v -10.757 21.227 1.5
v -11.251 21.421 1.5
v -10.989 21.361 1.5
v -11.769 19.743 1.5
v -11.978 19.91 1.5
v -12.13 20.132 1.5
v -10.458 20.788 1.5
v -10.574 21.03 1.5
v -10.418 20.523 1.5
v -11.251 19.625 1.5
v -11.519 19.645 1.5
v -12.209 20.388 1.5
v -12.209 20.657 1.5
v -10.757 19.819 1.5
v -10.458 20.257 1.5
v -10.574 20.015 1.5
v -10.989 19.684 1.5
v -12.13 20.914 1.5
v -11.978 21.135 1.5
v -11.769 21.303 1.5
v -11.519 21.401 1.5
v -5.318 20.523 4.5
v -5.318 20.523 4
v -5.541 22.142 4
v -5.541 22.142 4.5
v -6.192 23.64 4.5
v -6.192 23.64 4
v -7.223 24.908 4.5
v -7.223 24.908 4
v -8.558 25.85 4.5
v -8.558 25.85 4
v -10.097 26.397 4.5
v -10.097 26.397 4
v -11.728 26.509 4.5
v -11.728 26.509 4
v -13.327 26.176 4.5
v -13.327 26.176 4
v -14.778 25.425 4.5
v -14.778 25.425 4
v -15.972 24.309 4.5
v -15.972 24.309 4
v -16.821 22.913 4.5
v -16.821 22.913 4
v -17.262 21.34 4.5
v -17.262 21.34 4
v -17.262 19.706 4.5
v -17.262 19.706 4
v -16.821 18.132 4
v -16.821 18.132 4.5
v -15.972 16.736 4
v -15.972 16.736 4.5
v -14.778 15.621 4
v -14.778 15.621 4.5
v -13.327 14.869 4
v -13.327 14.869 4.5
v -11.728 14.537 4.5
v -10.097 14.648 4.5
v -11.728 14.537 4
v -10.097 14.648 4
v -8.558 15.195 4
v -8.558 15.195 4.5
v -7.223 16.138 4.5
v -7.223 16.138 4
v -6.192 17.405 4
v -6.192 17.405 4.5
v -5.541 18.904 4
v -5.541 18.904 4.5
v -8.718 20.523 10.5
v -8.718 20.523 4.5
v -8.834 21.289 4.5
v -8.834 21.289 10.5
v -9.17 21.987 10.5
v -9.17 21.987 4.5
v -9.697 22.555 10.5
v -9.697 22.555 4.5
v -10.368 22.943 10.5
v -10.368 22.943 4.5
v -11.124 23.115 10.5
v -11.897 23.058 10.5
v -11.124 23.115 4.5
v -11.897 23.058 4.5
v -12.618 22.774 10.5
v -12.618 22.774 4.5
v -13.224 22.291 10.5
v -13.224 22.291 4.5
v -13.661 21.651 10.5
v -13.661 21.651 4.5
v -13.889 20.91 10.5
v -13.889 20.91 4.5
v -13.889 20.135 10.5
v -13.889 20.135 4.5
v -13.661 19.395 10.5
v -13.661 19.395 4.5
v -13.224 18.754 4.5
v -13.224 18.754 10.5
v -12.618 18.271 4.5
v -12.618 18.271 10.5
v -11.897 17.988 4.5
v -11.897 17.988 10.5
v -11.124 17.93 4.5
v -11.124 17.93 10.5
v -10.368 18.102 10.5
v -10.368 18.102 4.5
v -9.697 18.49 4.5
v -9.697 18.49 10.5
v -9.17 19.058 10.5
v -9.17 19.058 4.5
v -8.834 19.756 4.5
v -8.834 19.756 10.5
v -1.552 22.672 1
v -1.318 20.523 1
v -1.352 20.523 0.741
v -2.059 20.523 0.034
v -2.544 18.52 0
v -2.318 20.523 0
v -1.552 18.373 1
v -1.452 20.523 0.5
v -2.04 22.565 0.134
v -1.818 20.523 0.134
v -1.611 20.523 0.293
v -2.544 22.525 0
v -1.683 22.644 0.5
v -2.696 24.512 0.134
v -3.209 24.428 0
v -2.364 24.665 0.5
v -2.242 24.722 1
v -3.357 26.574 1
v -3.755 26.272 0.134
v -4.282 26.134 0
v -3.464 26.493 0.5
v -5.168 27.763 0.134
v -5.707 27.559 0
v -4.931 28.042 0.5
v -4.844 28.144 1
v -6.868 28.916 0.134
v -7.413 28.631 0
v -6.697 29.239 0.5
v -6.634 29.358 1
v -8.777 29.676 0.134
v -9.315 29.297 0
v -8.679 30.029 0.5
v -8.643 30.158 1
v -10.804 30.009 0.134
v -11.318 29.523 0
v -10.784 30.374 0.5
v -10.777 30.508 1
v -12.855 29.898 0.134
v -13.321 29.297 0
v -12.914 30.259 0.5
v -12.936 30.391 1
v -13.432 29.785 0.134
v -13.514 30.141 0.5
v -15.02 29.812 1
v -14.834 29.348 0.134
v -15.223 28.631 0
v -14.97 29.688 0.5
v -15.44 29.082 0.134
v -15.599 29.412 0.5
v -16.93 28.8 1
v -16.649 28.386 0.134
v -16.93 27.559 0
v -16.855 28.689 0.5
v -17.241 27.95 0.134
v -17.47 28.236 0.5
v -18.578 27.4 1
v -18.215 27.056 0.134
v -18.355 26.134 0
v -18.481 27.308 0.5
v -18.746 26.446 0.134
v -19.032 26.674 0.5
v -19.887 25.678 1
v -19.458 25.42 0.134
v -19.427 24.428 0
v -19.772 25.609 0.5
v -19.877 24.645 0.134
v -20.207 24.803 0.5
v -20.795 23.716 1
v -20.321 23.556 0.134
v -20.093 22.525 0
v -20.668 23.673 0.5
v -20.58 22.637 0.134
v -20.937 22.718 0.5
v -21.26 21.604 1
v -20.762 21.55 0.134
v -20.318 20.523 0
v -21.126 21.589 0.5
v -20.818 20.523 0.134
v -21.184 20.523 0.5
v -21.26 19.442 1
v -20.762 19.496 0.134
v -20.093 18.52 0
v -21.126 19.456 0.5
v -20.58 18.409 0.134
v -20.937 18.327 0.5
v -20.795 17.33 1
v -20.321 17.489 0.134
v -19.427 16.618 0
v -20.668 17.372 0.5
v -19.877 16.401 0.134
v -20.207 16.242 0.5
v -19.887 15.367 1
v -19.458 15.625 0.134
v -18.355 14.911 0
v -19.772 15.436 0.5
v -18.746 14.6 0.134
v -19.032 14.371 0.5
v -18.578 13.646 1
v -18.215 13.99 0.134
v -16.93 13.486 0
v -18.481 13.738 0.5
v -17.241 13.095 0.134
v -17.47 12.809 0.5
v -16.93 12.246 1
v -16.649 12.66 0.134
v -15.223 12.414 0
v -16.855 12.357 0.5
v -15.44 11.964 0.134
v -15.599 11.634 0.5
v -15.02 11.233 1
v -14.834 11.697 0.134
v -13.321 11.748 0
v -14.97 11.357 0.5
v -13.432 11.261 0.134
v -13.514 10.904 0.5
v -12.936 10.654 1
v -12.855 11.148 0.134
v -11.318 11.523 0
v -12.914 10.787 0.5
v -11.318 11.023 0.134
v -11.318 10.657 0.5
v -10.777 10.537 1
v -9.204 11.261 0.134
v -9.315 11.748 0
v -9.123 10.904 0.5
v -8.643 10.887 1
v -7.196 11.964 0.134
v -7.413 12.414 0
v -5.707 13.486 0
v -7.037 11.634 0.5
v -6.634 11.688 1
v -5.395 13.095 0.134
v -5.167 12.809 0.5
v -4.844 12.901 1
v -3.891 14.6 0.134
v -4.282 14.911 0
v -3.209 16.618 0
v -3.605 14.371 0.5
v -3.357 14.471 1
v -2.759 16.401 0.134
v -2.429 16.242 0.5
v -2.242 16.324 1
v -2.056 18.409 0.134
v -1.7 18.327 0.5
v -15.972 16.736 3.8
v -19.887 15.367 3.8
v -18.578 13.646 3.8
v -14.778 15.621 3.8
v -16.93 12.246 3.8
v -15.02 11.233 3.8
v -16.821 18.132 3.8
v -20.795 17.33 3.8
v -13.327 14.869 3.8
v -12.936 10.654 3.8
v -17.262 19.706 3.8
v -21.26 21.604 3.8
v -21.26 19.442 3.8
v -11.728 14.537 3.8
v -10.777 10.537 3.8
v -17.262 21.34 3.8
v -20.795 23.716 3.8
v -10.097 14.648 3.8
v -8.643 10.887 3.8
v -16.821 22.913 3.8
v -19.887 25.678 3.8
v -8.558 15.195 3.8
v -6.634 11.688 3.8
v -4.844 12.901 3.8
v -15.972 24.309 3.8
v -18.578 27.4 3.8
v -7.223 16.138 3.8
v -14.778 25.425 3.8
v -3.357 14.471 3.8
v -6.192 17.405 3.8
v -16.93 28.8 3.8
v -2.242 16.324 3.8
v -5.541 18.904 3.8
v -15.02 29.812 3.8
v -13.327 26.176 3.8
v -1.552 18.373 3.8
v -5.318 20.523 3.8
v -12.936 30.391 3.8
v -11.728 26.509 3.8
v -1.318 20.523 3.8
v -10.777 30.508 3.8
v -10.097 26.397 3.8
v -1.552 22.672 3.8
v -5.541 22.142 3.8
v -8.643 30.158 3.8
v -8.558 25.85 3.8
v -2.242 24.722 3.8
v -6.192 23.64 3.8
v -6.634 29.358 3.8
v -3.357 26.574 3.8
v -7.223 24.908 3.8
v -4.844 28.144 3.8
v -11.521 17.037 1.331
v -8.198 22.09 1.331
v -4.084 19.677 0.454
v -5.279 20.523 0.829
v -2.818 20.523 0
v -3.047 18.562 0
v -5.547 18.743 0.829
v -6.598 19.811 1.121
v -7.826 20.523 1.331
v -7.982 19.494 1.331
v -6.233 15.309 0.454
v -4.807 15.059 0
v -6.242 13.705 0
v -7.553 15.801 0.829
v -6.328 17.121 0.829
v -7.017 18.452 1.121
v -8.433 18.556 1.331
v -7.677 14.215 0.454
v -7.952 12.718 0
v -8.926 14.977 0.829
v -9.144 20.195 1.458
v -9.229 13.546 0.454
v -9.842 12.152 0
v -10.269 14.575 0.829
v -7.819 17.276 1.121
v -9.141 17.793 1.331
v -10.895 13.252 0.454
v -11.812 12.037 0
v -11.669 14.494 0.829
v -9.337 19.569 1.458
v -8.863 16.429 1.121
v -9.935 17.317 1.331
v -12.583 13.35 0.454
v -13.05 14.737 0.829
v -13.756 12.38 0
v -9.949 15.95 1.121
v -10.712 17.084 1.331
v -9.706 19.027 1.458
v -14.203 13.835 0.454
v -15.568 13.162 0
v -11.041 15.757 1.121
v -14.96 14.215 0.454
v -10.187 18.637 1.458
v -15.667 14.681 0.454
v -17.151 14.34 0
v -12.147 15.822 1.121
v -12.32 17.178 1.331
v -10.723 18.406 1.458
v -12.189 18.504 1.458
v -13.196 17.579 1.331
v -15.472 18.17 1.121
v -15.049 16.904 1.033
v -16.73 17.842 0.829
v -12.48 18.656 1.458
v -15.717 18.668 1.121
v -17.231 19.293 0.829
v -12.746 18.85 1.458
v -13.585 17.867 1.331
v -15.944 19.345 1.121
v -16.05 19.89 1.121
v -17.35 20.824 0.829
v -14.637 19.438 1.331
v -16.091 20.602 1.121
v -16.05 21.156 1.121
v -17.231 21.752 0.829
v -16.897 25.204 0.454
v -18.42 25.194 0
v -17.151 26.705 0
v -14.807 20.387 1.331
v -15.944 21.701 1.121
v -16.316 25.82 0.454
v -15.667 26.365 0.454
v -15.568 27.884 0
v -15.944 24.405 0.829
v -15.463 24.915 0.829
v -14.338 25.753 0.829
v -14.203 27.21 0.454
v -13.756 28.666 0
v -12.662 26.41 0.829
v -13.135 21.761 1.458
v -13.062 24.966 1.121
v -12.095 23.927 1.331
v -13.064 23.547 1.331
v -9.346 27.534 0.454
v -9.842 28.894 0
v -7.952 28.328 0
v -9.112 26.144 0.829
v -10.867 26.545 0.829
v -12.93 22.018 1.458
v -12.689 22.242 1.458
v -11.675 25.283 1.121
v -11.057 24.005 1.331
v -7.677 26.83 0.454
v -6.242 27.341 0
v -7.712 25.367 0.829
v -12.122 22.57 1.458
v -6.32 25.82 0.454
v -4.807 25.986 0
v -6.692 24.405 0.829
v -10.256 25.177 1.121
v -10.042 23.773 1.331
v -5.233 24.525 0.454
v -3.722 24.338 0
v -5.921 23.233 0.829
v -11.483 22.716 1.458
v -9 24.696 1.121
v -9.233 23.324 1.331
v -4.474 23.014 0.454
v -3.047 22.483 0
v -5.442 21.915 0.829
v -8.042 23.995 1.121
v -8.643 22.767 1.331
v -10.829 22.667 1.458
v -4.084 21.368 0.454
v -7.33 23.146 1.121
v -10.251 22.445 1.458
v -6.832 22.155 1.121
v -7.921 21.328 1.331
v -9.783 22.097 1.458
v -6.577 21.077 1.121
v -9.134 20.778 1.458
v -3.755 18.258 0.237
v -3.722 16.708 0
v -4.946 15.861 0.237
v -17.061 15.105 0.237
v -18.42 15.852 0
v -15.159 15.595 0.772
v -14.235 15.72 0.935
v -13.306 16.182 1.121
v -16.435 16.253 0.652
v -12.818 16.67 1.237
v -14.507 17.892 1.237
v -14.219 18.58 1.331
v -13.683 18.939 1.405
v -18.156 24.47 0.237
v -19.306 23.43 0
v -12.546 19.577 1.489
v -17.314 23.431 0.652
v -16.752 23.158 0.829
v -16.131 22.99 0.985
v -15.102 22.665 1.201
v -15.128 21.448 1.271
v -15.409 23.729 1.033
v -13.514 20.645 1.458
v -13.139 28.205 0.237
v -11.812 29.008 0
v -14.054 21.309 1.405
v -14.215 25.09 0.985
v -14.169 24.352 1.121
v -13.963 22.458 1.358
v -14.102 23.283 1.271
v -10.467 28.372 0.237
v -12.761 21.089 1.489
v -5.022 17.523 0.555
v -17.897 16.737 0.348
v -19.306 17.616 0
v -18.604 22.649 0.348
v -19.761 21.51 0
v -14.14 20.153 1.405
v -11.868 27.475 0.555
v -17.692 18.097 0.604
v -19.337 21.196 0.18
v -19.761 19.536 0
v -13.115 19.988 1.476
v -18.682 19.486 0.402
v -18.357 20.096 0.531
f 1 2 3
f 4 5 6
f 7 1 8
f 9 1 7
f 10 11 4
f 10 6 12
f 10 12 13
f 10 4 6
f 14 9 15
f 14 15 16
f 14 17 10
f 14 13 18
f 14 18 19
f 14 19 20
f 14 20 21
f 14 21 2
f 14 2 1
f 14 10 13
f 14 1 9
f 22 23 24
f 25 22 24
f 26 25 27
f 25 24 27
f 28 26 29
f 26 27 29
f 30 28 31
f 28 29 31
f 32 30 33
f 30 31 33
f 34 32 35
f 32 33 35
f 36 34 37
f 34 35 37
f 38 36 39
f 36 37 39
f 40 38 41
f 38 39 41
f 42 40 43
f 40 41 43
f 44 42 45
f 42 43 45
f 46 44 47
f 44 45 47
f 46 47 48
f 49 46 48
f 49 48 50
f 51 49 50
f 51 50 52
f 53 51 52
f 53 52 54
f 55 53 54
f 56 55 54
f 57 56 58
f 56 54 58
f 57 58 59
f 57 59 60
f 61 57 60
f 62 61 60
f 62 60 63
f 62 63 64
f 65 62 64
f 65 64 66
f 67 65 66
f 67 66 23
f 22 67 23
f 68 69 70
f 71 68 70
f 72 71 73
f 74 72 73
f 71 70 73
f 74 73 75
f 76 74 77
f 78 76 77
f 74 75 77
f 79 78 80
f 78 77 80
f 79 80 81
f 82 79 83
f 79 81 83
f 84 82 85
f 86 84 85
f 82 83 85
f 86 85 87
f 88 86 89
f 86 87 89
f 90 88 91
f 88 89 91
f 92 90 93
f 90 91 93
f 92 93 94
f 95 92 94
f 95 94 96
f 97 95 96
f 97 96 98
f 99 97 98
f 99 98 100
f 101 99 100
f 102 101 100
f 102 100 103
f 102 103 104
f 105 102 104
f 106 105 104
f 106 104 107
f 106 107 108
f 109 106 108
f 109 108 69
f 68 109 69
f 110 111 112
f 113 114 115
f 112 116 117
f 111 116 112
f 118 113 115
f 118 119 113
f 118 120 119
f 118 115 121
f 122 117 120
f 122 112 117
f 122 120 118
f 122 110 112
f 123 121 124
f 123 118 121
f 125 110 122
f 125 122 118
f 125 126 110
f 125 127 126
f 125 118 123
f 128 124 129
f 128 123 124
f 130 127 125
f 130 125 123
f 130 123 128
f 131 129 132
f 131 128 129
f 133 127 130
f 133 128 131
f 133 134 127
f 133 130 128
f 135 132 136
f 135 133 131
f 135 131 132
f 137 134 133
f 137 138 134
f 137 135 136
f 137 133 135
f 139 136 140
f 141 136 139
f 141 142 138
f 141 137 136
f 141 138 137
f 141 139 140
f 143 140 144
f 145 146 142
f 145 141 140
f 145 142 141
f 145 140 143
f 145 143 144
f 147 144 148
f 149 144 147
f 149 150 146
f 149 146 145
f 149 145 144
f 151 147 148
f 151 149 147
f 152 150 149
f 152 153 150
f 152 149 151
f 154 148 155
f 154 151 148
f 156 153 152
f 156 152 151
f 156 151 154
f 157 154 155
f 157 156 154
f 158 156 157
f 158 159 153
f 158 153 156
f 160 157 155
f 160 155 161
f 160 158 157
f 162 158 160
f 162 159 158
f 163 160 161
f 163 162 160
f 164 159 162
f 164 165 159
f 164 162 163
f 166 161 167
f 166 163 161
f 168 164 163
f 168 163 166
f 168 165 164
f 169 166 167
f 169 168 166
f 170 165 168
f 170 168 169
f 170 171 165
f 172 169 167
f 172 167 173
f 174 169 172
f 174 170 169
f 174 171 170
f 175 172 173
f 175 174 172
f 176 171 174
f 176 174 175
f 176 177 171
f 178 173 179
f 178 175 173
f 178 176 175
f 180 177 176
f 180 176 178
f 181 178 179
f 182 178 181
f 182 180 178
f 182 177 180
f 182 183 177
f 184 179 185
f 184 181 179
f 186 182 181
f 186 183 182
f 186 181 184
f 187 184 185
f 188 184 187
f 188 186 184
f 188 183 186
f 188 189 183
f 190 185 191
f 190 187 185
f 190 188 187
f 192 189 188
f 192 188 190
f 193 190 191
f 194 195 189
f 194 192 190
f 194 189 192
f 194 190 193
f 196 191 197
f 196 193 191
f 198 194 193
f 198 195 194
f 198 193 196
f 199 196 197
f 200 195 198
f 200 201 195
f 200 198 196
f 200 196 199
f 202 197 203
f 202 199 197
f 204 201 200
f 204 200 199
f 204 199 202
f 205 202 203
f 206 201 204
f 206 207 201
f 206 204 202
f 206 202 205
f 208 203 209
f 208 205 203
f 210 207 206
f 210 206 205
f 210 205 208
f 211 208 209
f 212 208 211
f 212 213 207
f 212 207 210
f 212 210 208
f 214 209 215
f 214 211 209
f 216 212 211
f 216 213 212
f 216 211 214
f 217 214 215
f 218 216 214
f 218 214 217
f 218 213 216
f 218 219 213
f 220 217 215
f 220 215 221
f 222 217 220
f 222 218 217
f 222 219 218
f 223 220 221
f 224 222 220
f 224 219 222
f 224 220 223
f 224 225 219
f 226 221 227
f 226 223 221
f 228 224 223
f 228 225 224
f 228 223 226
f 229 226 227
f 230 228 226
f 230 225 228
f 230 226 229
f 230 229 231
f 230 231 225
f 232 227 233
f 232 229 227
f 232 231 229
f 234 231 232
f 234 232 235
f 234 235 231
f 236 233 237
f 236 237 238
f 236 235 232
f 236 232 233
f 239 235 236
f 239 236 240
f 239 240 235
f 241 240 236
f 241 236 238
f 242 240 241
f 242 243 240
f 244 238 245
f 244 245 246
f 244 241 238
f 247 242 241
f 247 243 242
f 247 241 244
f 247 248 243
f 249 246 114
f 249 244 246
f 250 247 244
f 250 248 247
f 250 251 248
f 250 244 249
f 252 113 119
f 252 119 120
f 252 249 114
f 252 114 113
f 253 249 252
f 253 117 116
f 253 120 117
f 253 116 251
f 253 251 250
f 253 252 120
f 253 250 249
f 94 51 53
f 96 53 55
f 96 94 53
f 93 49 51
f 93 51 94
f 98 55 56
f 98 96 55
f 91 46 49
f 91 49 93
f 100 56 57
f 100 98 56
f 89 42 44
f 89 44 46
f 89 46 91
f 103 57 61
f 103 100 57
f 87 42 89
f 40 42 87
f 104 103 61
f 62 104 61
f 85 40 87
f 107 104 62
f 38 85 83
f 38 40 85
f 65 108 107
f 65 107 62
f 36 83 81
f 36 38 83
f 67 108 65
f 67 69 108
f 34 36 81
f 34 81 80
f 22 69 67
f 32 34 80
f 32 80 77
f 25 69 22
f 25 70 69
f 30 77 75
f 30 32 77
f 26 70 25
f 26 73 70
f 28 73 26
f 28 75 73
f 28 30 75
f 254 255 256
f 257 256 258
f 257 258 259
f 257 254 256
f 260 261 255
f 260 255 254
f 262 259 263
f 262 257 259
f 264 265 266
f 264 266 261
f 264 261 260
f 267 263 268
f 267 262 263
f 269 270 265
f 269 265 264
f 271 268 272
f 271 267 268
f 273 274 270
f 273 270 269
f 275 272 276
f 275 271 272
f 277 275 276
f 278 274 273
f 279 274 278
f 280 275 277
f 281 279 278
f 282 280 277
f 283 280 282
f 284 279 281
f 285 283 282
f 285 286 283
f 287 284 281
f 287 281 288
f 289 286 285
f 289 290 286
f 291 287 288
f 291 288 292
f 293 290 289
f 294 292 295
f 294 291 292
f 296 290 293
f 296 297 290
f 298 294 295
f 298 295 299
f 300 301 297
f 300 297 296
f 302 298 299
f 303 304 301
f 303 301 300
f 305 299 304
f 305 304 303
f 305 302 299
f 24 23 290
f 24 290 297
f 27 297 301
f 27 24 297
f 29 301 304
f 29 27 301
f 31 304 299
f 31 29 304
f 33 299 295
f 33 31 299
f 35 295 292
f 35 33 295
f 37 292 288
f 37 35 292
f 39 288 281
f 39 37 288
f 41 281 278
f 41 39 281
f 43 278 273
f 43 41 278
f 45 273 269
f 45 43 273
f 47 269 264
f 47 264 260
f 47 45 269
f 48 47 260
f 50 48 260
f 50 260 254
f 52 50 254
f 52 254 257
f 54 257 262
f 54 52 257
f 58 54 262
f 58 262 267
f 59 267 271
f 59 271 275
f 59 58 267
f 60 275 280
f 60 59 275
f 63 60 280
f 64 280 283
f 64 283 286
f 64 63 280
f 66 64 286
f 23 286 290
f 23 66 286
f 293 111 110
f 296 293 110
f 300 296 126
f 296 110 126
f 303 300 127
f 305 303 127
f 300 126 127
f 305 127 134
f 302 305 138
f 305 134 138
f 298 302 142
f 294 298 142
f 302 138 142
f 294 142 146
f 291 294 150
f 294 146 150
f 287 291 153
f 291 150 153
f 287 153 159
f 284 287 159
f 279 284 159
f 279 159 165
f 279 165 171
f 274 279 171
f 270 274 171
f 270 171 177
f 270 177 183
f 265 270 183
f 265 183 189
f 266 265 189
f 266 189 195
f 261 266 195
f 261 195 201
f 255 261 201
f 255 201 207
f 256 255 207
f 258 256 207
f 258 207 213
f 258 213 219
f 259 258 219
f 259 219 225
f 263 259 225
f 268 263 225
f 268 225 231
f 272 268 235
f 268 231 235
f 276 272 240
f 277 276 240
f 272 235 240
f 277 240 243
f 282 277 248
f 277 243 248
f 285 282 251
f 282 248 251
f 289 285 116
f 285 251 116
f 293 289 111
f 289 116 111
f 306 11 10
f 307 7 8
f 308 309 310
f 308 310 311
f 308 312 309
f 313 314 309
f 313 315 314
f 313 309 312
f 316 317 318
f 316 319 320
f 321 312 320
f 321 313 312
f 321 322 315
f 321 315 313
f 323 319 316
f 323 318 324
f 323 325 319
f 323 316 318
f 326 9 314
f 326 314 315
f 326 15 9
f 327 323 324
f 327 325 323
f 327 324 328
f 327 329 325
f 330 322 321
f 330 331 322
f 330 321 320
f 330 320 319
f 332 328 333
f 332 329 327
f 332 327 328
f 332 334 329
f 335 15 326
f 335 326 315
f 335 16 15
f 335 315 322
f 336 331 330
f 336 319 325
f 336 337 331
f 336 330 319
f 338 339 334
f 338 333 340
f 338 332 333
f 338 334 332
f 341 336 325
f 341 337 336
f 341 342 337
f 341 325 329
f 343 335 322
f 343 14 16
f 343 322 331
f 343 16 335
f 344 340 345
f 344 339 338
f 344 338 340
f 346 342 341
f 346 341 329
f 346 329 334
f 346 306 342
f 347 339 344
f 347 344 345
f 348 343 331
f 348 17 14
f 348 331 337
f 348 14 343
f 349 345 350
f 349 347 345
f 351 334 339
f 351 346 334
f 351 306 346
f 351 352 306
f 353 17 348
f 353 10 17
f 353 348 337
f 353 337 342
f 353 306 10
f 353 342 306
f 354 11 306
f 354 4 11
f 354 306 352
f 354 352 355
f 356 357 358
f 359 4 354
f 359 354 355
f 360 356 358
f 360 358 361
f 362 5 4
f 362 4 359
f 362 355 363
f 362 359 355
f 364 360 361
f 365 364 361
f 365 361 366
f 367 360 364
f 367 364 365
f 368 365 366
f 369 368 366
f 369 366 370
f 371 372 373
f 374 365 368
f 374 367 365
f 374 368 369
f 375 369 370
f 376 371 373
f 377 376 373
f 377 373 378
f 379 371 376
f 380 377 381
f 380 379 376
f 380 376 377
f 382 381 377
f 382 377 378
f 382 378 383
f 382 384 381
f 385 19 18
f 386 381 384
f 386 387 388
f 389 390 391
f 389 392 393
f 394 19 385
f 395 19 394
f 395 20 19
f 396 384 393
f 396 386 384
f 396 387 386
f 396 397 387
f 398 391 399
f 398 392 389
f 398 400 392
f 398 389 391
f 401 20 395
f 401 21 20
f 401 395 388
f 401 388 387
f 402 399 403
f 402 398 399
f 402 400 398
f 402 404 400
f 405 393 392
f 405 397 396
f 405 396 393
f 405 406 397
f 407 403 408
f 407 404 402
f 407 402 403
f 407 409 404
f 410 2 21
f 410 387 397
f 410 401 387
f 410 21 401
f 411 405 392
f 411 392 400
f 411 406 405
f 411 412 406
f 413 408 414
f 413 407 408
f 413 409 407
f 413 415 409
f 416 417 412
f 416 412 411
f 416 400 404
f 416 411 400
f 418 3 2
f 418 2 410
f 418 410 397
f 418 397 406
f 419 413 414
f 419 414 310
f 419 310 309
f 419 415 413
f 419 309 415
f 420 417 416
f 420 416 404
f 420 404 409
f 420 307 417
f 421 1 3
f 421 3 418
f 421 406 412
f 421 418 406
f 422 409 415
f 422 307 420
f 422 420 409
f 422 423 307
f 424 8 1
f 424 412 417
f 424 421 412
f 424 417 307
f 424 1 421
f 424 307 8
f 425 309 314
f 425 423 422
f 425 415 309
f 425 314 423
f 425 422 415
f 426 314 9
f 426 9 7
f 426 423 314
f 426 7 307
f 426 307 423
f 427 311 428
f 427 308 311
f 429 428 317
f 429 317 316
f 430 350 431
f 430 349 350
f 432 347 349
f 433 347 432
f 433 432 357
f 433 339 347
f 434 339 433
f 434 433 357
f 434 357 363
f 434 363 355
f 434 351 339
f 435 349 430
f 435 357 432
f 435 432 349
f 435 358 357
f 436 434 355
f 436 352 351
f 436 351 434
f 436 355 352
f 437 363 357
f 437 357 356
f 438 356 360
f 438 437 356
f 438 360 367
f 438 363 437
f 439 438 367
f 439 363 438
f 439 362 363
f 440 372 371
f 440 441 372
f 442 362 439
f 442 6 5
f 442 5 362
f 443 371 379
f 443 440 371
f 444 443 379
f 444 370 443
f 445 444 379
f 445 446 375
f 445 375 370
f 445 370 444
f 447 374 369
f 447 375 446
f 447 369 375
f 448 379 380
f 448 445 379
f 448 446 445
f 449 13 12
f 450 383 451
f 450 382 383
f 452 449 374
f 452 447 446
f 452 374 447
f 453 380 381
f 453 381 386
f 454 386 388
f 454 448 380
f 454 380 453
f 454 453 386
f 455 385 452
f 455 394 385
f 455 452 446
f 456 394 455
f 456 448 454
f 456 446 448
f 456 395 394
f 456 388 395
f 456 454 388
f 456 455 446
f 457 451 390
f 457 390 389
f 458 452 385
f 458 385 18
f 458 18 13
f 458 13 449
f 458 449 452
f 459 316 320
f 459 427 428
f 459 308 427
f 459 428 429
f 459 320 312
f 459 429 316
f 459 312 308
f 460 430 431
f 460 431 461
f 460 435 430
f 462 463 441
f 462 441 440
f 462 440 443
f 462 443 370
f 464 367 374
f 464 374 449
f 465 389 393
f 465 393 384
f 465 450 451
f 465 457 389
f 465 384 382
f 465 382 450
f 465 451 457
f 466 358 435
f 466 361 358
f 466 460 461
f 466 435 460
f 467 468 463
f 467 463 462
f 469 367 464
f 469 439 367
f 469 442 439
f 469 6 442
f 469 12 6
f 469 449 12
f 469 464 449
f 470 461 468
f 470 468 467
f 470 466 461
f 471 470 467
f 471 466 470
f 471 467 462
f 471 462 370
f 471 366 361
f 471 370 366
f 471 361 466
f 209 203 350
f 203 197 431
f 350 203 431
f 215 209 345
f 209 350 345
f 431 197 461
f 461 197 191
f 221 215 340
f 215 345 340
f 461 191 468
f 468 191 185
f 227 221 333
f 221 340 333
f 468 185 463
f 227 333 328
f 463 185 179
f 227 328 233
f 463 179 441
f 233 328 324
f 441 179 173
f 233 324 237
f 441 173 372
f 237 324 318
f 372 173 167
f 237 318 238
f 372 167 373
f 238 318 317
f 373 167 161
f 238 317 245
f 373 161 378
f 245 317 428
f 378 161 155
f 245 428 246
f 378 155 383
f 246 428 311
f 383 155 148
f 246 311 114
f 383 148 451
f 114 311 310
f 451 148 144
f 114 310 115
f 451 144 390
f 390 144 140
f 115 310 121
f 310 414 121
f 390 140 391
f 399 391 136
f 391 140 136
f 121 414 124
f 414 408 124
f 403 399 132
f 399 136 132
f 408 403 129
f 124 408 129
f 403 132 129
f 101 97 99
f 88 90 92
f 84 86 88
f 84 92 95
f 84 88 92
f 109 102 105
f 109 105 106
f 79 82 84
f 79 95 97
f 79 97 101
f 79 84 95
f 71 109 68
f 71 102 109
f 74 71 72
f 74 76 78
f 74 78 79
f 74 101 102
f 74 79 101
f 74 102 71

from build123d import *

# Parameters (mm, degrees)
F0_R     = 10
F0_R_2   = 6
F1_DEPTH = 4
F0_R_3   = 2.6
F2_DEPTH = 4.5
F3_DEPTH = 10.5
F4_R     = 8.5
F5_DEPTH = 1.5
F7_R     = 1
F8_DEPTH = 0.2


# Not quite as in the source:
# - a fillet or chamfer that OpenCascade refuses, or shapes differently, is made with other operations: its cross-section is extruded or revolved along the edge and cut away or added


with BuildPart() as f1:
    # F0 (on Top) → F1 (new body)
    with BuildSketch(Plane.XY):
        with Locations((-11.3181825727, 20.5227266997)):
            Circle(F0_R)
        with Locations((-11.3181825727, 20.5227266997)):
            Circle(F0_R_2, mode=Mode.SUBTRACT)
    extrude(amount=F1_DEPTH)

    # F0 (on Top) → F2 (join)
    with BuildSketch(Plane.XY):
        with Locations((-11.3181825727, 20.5227266997)):
            Circle(F0_R_2)
        with Locations((-11.3181825727, 20.5227266997)):
            Circle(F0_R_3, mode=Mode.SUBTRACT)
    extrude(amount=F2_DEPTH)

    # F0 (on Top) → F3 (join)
    with BuildSketch(Plane.XY):
        with Locations((-11.3181825727, 20.5227266997)):
            Circle(F0_R_3)
    extrude(amount=F3_DEPTH)

    # F4 (on face) → F5 (cut)
    with BuildSketch(Plane(origin=(0, 0, 0), x_dir=(1, 0, 0), z_dir=(0, 0, -1))):
        with Locations((-11.3181825727, -20.5227266997)):
            Circle(F4_R)
    extrude(amount=-F5_DEPTH, mode=Mode.SUBTRACT)

    # F6: fillet of radius 20 on 1 edges, made by hand

    # F6_s1 → F6_t2 (revolve)
    with BuildSketch(Plane.XZ.offset(-20.5227266997)):
        with BuildLine():
            ThreePointArc((-2.8181825727, 0), (-6.5445413033, 1.1214168703), (-10.4175246495, 1.5))
            Line((-10.4175246495, 1.5), (-2.8181825727, 1.5))
            Line((-2.8181825727, 1.5), (-2.8181825727, 0))
        make_face()
    revolve(axis=Axis((-11.3181825727, 20.5227266997, 1.5), (0, 0, -1)))

    # F7
    f7_edges = [f1.edges().sort_by_distance(p)[0] for p in [
        (-21.318183, 20.522727, 0),
    ]]
    fillet(f7_edges, radius=F7_R)

    # F8 (cut): a face of the model
    f8_faces = [f1.faces().sort_by_distance(p)[0] for p in [
        (-21.0353398602, 20.5227266997, 4),
    ]]
    extrude(f8_faces, amount=-F8_DEPTH, mode=Mode.SUBTRACT)


solid = f1.part
